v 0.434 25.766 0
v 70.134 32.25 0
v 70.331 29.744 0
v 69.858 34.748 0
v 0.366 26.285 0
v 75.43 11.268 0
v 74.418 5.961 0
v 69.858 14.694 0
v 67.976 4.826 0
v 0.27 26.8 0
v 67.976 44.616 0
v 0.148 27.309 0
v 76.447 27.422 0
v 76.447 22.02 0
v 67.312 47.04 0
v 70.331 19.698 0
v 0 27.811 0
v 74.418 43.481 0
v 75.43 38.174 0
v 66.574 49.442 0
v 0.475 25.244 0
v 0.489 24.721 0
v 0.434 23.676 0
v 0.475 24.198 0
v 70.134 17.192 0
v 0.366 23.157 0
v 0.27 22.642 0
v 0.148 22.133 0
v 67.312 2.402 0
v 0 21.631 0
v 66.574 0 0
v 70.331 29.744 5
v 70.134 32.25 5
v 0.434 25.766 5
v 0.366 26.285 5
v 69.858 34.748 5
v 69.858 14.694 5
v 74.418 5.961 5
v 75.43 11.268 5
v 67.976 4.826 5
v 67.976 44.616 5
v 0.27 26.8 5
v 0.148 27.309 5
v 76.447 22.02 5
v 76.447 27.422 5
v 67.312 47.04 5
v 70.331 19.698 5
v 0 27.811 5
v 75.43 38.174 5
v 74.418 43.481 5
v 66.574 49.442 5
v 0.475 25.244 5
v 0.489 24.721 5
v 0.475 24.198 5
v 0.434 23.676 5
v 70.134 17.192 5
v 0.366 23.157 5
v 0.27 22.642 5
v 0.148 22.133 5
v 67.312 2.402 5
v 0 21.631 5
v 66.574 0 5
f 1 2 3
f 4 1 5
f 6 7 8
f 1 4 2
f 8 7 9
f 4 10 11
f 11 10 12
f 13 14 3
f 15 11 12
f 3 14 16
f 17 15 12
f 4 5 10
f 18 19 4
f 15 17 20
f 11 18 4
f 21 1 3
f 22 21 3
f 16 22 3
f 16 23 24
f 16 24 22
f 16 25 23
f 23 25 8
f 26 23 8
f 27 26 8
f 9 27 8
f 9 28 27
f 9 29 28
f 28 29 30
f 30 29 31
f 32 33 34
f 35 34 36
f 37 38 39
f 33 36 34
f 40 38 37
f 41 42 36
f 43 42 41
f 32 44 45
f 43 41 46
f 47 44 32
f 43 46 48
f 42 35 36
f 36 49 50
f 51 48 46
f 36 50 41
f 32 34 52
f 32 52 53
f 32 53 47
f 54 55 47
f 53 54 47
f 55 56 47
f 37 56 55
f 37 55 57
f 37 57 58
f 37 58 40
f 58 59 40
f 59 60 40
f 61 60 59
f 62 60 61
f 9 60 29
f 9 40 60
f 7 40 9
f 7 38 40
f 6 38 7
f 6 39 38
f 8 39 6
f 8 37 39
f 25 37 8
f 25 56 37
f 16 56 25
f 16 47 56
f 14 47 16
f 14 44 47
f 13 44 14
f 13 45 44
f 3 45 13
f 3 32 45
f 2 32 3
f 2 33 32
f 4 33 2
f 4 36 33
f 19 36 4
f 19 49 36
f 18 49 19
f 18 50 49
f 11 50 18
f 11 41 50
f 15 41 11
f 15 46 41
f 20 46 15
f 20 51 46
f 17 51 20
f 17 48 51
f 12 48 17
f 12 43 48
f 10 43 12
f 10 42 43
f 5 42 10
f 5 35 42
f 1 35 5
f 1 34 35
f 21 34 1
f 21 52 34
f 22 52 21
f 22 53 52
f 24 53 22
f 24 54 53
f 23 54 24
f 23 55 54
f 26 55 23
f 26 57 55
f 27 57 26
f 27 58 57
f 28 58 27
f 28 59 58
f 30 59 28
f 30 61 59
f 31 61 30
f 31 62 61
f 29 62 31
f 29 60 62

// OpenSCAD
$fn = 32;

// ----------------------------------------------------------------------
// Gear sector: 3 teeth on 36 degrees
// ----------------------------------------------------------------------

// --- parameters (mm) ---
sector_angle = 36;        // sector angle, degrees
root_r = 80;              // root circle radius
tooth_h = 6;              // tooth height over the root circle
teeth = 3;                // number of teeth on the sector
hub_r = 10;               // hub bore radius
plate_t = 5;              // sector thickness, Z
arc_step = 3;             // sampling step of the root/hub arcs, degrees

tip_r = root_r + tooth_h;  // tip circle radius

profile = [[66.574, 0], [67.312, 2.402], [67.976, 4.826], [74.418, 5.961], [75.43, 11.268], [69.858, 14.694], [70.134, 17.192], [70.331, 19.698], [76.447, 22.02], [76.447, 27.422], [70.331, 29.744], [70.134, 32.25], [69.858, 34.748], [75.43, 38.174], [74.418, 43.481], [67.976, 44.616], [67.312, 47.04], [66.574, 49.442], [0, 27.811], [0.148, 27.309], [0.27, 26.8], [0.366, 26.285], [0.434, 25.766], [0.475, 25.244], [0.489, 24.721], [0.475, 24.198], [0.434, 23.676], [0.366, 23.157], [0.27, 22.642], [0.148, 22.133], [0, 21.631]];  // primary outline, 31 points, counter clockwise

// --- the one profile operation ---
linear_extrude(height = plate_t) polygon(points = profile);
